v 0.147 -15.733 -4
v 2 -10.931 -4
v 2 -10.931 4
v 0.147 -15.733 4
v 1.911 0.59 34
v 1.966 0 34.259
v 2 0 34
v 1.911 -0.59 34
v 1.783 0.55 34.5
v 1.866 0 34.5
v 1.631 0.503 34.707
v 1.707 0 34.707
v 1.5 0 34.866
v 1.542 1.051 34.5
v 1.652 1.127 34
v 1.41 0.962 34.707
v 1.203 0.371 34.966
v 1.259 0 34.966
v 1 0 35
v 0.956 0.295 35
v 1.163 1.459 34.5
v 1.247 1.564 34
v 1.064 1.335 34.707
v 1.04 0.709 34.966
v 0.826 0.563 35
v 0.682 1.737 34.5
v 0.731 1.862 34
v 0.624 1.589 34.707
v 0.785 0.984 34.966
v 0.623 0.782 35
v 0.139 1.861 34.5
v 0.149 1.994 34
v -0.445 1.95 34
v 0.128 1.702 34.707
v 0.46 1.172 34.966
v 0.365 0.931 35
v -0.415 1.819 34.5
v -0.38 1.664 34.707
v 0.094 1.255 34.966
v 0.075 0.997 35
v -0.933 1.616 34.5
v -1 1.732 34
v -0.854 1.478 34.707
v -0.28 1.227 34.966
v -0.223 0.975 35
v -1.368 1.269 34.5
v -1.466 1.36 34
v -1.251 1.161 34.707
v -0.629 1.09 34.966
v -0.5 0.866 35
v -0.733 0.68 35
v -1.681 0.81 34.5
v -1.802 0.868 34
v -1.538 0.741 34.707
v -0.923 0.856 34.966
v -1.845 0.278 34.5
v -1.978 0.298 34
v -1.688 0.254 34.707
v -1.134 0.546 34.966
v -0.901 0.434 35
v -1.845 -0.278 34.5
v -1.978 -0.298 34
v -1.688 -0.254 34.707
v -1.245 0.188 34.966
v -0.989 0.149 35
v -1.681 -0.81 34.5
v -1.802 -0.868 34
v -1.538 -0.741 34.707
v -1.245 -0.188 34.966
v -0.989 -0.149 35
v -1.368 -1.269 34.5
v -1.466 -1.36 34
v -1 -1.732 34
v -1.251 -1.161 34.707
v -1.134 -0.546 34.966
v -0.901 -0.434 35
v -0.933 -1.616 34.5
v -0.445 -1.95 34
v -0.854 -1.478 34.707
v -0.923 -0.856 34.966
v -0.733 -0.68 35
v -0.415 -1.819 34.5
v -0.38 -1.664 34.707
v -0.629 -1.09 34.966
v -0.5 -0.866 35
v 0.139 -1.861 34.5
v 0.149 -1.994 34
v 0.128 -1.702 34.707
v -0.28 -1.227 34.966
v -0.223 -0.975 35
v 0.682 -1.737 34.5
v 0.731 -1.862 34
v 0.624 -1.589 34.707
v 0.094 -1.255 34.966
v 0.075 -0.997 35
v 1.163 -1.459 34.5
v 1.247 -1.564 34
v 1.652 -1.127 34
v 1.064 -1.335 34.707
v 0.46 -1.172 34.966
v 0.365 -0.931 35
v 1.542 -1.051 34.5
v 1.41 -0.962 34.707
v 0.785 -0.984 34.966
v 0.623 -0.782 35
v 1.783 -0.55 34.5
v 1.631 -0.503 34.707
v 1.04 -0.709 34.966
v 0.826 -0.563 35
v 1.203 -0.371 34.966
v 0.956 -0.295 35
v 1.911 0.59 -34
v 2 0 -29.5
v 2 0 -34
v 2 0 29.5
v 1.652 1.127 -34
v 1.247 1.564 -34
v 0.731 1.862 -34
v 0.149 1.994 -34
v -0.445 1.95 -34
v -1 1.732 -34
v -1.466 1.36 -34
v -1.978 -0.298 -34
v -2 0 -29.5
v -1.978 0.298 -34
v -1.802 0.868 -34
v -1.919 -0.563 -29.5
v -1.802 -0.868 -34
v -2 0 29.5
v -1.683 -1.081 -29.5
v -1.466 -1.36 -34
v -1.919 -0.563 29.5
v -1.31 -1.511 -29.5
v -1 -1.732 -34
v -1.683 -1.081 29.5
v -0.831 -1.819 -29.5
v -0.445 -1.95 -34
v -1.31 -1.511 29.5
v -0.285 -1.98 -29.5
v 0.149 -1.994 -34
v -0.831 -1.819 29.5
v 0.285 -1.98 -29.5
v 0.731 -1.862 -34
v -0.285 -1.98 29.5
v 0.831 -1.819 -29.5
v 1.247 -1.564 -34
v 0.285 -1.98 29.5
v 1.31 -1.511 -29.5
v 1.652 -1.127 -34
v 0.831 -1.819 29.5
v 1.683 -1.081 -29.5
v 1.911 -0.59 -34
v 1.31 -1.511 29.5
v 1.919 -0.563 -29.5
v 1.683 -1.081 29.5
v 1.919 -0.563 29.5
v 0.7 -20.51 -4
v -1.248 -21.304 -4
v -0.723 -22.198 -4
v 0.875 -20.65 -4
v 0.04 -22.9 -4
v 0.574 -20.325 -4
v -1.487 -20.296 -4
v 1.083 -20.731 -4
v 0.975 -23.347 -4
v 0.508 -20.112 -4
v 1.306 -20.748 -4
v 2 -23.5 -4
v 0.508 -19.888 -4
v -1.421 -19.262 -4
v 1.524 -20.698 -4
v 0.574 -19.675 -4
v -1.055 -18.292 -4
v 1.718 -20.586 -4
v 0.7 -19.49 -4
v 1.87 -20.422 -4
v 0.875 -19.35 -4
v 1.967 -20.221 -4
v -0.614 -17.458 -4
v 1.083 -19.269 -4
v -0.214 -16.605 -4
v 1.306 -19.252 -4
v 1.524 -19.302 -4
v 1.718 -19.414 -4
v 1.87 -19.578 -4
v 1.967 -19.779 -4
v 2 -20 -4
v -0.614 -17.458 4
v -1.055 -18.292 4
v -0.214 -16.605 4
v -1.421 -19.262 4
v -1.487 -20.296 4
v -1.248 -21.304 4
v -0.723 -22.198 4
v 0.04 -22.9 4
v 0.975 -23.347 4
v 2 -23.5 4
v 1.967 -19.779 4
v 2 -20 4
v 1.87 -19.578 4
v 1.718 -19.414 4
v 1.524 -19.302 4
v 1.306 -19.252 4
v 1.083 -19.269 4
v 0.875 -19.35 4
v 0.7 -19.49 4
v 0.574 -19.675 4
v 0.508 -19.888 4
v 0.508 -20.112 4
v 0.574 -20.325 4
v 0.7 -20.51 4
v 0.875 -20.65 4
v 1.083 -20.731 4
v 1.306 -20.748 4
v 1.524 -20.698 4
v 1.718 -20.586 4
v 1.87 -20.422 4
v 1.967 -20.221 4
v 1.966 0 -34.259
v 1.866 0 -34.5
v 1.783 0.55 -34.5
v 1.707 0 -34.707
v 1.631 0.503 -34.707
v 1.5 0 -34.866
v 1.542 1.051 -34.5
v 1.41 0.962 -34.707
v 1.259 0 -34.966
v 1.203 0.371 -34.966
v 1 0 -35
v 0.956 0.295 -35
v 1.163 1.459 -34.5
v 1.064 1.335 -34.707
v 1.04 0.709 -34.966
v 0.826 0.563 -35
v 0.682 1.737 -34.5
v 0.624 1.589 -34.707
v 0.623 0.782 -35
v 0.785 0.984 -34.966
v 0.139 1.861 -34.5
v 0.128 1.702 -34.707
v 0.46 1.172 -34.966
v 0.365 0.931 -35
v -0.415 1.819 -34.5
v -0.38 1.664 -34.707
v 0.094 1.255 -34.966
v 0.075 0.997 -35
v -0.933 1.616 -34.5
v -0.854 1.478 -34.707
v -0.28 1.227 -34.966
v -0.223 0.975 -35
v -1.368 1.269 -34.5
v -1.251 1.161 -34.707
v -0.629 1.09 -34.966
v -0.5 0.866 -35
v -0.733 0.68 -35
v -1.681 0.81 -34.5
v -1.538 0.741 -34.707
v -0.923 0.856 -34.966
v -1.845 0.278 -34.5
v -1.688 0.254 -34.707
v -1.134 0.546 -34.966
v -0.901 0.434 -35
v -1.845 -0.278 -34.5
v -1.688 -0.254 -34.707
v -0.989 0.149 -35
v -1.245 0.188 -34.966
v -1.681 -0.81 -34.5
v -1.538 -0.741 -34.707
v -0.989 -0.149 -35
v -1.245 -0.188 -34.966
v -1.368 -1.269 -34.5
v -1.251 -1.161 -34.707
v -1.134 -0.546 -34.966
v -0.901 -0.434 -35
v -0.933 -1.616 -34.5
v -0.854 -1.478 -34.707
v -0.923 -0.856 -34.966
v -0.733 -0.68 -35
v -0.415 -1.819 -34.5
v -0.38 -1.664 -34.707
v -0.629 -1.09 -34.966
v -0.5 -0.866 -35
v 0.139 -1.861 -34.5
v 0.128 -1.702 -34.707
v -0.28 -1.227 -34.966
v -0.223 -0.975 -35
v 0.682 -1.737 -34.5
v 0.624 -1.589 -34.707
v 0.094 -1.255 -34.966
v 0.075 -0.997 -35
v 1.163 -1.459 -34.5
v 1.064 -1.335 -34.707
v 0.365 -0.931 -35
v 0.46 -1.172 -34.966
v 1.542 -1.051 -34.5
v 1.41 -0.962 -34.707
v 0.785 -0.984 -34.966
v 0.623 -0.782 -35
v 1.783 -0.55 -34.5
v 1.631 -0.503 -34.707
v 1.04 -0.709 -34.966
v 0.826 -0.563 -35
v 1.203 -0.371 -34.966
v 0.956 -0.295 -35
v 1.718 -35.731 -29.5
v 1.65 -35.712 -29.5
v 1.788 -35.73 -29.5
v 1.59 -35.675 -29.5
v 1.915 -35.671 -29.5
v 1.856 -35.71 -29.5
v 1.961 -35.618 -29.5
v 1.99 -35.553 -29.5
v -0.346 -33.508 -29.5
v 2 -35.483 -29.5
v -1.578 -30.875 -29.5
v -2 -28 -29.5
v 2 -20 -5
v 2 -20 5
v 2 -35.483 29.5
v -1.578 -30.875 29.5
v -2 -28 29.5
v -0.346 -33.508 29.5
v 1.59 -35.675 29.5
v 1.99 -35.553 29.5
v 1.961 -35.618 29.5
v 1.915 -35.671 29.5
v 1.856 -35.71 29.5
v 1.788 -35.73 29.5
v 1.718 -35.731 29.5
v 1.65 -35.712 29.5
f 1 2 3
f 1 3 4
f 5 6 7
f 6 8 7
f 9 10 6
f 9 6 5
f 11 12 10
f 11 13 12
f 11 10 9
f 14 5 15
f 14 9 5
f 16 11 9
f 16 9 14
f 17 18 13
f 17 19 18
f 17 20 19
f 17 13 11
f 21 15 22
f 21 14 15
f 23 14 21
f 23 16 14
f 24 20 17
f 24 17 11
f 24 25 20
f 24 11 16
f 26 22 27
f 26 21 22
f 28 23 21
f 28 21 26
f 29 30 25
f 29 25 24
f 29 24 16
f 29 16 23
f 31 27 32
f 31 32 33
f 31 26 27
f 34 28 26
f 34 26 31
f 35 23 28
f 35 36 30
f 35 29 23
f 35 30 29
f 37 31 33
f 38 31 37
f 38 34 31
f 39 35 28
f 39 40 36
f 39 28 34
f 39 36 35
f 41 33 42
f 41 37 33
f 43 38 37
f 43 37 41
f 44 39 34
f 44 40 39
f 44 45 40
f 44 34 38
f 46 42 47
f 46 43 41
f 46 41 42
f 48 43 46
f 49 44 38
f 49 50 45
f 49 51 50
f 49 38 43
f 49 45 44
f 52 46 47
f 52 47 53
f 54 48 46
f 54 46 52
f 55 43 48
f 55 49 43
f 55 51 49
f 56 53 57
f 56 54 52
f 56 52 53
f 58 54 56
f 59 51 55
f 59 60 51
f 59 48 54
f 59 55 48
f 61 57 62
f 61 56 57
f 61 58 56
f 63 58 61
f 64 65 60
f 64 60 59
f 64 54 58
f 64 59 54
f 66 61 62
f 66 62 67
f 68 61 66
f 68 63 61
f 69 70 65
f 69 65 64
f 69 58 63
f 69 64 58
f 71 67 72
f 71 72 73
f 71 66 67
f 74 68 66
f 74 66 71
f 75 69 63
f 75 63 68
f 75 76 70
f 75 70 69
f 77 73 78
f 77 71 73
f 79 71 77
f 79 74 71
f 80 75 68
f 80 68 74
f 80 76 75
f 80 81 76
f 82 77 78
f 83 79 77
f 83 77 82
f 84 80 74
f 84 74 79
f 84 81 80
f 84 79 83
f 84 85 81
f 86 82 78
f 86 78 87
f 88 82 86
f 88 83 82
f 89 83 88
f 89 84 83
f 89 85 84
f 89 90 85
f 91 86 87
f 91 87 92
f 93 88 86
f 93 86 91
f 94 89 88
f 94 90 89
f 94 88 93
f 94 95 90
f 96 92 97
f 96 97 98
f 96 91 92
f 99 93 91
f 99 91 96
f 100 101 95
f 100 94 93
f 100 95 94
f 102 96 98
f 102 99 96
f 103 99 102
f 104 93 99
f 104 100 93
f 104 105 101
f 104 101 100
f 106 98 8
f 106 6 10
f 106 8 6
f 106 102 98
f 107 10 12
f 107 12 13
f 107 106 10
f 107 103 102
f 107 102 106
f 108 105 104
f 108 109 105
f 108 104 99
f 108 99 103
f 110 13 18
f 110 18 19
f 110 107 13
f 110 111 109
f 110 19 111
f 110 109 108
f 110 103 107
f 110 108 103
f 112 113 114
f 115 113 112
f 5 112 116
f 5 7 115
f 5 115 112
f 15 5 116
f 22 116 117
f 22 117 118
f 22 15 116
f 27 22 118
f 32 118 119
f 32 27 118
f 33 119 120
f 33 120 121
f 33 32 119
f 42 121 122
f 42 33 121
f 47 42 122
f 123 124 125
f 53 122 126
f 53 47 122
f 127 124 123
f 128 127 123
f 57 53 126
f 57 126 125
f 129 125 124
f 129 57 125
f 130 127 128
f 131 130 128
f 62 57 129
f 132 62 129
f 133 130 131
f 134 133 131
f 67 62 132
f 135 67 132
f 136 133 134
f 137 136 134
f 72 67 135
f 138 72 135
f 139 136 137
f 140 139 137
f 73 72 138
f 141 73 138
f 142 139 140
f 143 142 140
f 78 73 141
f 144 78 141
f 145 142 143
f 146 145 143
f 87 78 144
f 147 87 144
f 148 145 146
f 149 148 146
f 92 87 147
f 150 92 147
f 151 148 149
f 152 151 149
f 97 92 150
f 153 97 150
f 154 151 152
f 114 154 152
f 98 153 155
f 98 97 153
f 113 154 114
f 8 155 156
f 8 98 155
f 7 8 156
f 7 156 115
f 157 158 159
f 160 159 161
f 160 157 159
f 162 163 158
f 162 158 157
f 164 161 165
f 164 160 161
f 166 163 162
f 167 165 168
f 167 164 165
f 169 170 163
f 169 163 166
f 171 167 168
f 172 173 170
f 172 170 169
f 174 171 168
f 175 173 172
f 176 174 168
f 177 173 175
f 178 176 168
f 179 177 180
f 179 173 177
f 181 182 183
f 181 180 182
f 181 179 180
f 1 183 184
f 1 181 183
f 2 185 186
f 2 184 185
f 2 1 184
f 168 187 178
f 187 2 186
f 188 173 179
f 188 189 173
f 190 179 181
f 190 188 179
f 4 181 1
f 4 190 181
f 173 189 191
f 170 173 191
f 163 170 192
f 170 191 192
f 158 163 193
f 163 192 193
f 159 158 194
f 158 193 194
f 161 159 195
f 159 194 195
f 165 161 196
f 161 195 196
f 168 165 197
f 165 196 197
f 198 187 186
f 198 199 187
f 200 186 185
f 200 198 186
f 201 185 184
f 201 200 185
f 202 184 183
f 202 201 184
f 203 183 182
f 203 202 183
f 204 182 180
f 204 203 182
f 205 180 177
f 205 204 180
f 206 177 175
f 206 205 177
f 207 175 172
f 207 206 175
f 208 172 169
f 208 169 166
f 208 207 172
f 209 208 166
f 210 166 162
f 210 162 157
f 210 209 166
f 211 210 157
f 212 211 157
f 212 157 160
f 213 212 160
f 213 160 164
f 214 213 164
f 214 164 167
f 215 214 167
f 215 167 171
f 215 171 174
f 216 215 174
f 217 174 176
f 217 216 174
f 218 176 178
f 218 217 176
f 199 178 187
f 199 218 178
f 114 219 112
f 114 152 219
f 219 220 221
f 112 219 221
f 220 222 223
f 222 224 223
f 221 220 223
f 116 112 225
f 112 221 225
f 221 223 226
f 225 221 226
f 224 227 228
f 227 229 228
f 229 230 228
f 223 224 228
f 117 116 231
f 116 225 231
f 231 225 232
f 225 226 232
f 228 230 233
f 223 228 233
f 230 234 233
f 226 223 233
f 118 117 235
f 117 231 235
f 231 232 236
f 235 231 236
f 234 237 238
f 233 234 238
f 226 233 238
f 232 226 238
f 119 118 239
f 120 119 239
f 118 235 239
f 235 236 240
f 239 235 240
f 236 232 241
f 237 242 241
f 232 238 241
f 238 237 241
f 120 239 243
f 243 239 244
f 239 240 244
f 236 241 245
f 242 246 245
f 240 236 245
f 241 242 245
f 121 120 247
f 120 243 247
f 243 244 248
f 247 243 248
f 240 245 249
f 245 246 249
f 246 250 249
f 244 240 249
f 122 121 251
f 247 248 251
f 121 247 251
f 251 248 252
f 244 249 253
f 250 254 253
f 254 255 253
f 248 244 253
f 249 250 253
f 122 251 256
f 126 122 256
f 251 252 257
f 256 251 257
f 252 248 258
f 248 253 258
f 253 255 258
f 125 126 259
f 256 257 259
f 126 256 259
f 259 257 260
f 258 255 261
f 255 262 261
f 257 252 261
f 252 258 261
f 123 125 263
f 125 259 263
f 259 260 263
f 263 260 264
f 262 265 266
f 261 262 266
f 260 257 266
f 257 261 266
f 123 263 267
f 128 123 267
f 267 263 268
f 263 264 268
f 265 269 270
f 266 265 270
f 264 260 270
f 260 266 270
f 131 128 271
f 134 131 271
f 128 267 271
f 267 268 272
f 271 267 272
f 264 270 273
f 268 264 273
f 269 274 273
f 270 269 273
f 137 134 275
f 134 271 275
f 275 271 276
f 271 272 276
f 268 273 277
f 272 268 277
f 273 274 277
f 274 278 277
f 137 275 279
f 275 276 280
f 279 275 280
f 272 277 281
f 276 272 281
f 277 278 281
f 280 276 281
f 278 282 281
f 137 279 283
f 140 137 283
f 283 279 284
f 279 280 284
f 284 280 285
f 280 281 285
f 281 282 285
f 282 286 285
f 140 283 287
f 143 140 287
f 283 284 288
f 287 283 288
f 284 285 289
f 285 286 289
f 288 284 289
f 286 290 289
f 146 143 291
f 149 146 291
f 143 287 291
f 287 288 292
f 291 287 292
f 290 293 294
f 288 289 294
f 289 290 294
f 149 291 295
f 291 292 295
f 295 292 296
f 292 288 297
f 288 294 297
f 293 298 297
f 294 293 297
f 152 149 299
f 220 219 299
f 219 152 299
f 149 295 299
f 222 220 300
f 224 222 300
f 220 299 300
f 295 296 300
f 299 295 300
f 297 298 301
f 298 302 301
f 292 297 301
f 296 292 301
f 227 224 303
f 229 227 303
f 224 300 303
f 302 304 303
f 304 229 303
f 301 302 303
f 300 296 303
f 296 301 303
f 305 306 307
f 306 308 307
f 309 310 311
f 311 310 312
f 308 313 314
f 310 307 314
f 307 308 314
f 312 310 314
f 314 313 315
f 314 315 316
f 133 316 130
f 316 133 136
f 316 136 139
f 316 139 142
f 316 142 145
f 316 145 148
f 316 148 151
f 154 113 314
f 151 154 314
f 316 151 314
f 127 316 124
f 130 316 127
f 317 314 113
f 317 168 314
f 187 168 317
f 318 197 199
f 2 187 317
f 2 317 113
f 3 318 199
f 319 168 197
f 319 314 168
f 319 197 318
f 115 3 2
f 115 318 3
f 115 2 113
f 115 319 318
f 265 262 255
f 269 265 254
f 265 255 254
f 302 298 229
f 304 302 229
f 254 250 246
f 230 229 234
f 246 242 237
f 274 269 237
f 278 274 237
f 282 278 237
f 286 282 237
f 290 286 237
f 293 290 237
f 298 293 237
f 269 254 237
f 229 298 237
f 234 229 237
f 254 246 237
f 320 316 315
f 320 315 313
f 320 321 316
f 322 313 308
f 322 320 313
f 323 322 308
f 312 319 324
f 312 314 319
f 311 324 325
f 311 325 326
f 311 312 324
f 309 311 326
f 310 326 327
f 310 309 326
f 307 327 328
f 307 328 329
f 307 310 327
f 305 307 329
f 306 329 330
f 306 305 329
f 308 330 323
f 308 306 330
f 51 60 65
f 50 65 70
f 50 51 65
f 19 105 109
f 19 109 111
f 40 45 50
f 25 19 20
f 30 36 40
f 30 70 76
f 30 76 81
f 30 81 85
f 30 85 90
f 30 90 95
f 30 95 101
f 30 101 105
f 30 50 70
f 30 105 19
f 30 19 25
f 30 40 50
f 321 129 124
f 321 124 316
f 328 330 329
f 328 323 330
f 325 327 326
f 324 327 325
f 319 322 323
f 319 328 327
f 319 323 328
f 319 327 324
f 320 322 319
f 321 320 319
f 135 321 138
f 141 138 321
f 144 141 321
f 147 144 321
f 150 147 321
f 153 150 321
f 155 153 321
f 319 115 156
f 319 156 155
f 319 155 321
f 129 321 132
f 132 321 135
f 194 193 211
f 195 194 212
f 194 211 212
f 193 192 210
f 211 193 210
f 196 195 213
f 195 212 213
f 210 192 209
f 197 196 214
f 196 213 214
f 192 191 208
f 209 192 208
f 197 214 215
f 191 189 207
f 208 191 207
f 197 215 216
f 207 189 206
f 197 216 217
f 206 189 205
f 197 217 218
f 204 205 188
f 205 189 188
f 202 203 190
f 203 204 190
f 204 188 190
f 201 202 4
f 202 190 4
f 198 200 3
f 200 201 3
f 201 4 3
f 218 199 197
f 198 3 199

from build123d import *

# Parameters (mm, degrees)
BOSS_EXTRUDE1_DEPTH = 29.5
SKETCH3_4_R         = 2
BOSS_EXTRUDE2_DEPTH = 35
FILLET1_R           = 1
FILLET2_R           = 0.25
SKETCH4_R           = 3.5
CUT_EXTRUDE1_DEPTH  = 4
SKETCH5_R           = 0.75
BOSS_EXTRUDE3_DEPTH = 5
FILLET3_R           = 20


with BuildPart() as part:
    # Sketch3 → Boss-Extrude1 (new, symmetric)
    with BuildSketch(Plane.XY):
        with BuildLine():
            Line((2, -36), (2, 0))
            ThreePointArc((2, 0), (0, -2), (-2, 0))
            Line((-2, 0), (-2, -28))
            ThreePointArc((-2, -28), (-0.94427191, -32.472135955), (2, -36))
        make_face()
    extrude(amount=BOSS_EXTRUDE1_DEPTH, both=True)

    # Sketch3<4> → Boss-Extrude2 (add, symmetric)
    with BuildSketch(Plane.XY):
        Circle(SKETCH3_4_R)
    extrude(amount=BOSS_EXTRUDE2_DEPTH, both=True)

    # Fillet1
    fillet1_edges = [part.edges().sort_by_distance(p)[0] for p in [
        (-2, 0, -35),
        (-2, 0, 35),
    ]]
    fillet(fillet1_edges, radius=FILLET1_R)

    # Fillet2
    fillet2_edges = [part.edges().sort_by_distance(p)[0] for p in [
        (2, -36, 0),
    ]]
    fillet(fillet2_edges, radius=FILLET2_R)

    # Sketch4 → Cut-Extrude1 (cut, symmetric)
    with BuildSketch(Plane.XY):
        with Locations((2, -20)):
            Circle(SKETCH4_R)
    extrude(amount=CUT_EXTRUDE1_DEPTH, both=True, mode=Mode.SUBTRACT)

    # Sketch5 → Boss-Extrude3 (add, symmetric)
    with BuildSketch(Plane.XY):
        with Locations((1.25, -20)):
            Circle(SKETCH5_R)
    extrude(amount=BOSS_EXTRUDE3_DEPTH, both=True)

    # Chamfer1
    # the kernel refuses this chamfer: 10 mm, written as the material it takes off along each edge
    with BuildSketch(Plane(origin=(2, -16.5, -4), x_dir=(0.024228479876225433, 0.9997064472948483, 0), z_dir=(0, 0, 1))) as chamfer1_piece_1:
        with BuildLine():
            Line((5.944098049, 0), (-1.587763168, 2.698932243))
            Line((-1.587763168, 2.698932243), (-1.718492524, 2.54757229))
            ThreePointArc((-1.718492524, 2.54757229), (-0.583435154, 1.461046885), (-0.199941289, -0.004845696))
            Line((-0.199941289, -0.004845696), (0.004845696, -0.199941289))
            ThreePointArc((0.004845696, -0.199941289), (2.975150071, -0.127954198), (5.948943745, -0.199941289))
            Line((5.948943745, -0.199941289), (5.944098049, 0))
        make_face()
    extrude(amount=8, mode=Mode.SUBTRACT)

    # Fillet3
    fillet3_edges = [part.edges().sort_by_distance(p)[0] for p in [
        (-0.592592593, -17.648731481, 0),
    ]]
    fillet(fillet3_edges, radius=FILLET3_R)


solid = part.part
